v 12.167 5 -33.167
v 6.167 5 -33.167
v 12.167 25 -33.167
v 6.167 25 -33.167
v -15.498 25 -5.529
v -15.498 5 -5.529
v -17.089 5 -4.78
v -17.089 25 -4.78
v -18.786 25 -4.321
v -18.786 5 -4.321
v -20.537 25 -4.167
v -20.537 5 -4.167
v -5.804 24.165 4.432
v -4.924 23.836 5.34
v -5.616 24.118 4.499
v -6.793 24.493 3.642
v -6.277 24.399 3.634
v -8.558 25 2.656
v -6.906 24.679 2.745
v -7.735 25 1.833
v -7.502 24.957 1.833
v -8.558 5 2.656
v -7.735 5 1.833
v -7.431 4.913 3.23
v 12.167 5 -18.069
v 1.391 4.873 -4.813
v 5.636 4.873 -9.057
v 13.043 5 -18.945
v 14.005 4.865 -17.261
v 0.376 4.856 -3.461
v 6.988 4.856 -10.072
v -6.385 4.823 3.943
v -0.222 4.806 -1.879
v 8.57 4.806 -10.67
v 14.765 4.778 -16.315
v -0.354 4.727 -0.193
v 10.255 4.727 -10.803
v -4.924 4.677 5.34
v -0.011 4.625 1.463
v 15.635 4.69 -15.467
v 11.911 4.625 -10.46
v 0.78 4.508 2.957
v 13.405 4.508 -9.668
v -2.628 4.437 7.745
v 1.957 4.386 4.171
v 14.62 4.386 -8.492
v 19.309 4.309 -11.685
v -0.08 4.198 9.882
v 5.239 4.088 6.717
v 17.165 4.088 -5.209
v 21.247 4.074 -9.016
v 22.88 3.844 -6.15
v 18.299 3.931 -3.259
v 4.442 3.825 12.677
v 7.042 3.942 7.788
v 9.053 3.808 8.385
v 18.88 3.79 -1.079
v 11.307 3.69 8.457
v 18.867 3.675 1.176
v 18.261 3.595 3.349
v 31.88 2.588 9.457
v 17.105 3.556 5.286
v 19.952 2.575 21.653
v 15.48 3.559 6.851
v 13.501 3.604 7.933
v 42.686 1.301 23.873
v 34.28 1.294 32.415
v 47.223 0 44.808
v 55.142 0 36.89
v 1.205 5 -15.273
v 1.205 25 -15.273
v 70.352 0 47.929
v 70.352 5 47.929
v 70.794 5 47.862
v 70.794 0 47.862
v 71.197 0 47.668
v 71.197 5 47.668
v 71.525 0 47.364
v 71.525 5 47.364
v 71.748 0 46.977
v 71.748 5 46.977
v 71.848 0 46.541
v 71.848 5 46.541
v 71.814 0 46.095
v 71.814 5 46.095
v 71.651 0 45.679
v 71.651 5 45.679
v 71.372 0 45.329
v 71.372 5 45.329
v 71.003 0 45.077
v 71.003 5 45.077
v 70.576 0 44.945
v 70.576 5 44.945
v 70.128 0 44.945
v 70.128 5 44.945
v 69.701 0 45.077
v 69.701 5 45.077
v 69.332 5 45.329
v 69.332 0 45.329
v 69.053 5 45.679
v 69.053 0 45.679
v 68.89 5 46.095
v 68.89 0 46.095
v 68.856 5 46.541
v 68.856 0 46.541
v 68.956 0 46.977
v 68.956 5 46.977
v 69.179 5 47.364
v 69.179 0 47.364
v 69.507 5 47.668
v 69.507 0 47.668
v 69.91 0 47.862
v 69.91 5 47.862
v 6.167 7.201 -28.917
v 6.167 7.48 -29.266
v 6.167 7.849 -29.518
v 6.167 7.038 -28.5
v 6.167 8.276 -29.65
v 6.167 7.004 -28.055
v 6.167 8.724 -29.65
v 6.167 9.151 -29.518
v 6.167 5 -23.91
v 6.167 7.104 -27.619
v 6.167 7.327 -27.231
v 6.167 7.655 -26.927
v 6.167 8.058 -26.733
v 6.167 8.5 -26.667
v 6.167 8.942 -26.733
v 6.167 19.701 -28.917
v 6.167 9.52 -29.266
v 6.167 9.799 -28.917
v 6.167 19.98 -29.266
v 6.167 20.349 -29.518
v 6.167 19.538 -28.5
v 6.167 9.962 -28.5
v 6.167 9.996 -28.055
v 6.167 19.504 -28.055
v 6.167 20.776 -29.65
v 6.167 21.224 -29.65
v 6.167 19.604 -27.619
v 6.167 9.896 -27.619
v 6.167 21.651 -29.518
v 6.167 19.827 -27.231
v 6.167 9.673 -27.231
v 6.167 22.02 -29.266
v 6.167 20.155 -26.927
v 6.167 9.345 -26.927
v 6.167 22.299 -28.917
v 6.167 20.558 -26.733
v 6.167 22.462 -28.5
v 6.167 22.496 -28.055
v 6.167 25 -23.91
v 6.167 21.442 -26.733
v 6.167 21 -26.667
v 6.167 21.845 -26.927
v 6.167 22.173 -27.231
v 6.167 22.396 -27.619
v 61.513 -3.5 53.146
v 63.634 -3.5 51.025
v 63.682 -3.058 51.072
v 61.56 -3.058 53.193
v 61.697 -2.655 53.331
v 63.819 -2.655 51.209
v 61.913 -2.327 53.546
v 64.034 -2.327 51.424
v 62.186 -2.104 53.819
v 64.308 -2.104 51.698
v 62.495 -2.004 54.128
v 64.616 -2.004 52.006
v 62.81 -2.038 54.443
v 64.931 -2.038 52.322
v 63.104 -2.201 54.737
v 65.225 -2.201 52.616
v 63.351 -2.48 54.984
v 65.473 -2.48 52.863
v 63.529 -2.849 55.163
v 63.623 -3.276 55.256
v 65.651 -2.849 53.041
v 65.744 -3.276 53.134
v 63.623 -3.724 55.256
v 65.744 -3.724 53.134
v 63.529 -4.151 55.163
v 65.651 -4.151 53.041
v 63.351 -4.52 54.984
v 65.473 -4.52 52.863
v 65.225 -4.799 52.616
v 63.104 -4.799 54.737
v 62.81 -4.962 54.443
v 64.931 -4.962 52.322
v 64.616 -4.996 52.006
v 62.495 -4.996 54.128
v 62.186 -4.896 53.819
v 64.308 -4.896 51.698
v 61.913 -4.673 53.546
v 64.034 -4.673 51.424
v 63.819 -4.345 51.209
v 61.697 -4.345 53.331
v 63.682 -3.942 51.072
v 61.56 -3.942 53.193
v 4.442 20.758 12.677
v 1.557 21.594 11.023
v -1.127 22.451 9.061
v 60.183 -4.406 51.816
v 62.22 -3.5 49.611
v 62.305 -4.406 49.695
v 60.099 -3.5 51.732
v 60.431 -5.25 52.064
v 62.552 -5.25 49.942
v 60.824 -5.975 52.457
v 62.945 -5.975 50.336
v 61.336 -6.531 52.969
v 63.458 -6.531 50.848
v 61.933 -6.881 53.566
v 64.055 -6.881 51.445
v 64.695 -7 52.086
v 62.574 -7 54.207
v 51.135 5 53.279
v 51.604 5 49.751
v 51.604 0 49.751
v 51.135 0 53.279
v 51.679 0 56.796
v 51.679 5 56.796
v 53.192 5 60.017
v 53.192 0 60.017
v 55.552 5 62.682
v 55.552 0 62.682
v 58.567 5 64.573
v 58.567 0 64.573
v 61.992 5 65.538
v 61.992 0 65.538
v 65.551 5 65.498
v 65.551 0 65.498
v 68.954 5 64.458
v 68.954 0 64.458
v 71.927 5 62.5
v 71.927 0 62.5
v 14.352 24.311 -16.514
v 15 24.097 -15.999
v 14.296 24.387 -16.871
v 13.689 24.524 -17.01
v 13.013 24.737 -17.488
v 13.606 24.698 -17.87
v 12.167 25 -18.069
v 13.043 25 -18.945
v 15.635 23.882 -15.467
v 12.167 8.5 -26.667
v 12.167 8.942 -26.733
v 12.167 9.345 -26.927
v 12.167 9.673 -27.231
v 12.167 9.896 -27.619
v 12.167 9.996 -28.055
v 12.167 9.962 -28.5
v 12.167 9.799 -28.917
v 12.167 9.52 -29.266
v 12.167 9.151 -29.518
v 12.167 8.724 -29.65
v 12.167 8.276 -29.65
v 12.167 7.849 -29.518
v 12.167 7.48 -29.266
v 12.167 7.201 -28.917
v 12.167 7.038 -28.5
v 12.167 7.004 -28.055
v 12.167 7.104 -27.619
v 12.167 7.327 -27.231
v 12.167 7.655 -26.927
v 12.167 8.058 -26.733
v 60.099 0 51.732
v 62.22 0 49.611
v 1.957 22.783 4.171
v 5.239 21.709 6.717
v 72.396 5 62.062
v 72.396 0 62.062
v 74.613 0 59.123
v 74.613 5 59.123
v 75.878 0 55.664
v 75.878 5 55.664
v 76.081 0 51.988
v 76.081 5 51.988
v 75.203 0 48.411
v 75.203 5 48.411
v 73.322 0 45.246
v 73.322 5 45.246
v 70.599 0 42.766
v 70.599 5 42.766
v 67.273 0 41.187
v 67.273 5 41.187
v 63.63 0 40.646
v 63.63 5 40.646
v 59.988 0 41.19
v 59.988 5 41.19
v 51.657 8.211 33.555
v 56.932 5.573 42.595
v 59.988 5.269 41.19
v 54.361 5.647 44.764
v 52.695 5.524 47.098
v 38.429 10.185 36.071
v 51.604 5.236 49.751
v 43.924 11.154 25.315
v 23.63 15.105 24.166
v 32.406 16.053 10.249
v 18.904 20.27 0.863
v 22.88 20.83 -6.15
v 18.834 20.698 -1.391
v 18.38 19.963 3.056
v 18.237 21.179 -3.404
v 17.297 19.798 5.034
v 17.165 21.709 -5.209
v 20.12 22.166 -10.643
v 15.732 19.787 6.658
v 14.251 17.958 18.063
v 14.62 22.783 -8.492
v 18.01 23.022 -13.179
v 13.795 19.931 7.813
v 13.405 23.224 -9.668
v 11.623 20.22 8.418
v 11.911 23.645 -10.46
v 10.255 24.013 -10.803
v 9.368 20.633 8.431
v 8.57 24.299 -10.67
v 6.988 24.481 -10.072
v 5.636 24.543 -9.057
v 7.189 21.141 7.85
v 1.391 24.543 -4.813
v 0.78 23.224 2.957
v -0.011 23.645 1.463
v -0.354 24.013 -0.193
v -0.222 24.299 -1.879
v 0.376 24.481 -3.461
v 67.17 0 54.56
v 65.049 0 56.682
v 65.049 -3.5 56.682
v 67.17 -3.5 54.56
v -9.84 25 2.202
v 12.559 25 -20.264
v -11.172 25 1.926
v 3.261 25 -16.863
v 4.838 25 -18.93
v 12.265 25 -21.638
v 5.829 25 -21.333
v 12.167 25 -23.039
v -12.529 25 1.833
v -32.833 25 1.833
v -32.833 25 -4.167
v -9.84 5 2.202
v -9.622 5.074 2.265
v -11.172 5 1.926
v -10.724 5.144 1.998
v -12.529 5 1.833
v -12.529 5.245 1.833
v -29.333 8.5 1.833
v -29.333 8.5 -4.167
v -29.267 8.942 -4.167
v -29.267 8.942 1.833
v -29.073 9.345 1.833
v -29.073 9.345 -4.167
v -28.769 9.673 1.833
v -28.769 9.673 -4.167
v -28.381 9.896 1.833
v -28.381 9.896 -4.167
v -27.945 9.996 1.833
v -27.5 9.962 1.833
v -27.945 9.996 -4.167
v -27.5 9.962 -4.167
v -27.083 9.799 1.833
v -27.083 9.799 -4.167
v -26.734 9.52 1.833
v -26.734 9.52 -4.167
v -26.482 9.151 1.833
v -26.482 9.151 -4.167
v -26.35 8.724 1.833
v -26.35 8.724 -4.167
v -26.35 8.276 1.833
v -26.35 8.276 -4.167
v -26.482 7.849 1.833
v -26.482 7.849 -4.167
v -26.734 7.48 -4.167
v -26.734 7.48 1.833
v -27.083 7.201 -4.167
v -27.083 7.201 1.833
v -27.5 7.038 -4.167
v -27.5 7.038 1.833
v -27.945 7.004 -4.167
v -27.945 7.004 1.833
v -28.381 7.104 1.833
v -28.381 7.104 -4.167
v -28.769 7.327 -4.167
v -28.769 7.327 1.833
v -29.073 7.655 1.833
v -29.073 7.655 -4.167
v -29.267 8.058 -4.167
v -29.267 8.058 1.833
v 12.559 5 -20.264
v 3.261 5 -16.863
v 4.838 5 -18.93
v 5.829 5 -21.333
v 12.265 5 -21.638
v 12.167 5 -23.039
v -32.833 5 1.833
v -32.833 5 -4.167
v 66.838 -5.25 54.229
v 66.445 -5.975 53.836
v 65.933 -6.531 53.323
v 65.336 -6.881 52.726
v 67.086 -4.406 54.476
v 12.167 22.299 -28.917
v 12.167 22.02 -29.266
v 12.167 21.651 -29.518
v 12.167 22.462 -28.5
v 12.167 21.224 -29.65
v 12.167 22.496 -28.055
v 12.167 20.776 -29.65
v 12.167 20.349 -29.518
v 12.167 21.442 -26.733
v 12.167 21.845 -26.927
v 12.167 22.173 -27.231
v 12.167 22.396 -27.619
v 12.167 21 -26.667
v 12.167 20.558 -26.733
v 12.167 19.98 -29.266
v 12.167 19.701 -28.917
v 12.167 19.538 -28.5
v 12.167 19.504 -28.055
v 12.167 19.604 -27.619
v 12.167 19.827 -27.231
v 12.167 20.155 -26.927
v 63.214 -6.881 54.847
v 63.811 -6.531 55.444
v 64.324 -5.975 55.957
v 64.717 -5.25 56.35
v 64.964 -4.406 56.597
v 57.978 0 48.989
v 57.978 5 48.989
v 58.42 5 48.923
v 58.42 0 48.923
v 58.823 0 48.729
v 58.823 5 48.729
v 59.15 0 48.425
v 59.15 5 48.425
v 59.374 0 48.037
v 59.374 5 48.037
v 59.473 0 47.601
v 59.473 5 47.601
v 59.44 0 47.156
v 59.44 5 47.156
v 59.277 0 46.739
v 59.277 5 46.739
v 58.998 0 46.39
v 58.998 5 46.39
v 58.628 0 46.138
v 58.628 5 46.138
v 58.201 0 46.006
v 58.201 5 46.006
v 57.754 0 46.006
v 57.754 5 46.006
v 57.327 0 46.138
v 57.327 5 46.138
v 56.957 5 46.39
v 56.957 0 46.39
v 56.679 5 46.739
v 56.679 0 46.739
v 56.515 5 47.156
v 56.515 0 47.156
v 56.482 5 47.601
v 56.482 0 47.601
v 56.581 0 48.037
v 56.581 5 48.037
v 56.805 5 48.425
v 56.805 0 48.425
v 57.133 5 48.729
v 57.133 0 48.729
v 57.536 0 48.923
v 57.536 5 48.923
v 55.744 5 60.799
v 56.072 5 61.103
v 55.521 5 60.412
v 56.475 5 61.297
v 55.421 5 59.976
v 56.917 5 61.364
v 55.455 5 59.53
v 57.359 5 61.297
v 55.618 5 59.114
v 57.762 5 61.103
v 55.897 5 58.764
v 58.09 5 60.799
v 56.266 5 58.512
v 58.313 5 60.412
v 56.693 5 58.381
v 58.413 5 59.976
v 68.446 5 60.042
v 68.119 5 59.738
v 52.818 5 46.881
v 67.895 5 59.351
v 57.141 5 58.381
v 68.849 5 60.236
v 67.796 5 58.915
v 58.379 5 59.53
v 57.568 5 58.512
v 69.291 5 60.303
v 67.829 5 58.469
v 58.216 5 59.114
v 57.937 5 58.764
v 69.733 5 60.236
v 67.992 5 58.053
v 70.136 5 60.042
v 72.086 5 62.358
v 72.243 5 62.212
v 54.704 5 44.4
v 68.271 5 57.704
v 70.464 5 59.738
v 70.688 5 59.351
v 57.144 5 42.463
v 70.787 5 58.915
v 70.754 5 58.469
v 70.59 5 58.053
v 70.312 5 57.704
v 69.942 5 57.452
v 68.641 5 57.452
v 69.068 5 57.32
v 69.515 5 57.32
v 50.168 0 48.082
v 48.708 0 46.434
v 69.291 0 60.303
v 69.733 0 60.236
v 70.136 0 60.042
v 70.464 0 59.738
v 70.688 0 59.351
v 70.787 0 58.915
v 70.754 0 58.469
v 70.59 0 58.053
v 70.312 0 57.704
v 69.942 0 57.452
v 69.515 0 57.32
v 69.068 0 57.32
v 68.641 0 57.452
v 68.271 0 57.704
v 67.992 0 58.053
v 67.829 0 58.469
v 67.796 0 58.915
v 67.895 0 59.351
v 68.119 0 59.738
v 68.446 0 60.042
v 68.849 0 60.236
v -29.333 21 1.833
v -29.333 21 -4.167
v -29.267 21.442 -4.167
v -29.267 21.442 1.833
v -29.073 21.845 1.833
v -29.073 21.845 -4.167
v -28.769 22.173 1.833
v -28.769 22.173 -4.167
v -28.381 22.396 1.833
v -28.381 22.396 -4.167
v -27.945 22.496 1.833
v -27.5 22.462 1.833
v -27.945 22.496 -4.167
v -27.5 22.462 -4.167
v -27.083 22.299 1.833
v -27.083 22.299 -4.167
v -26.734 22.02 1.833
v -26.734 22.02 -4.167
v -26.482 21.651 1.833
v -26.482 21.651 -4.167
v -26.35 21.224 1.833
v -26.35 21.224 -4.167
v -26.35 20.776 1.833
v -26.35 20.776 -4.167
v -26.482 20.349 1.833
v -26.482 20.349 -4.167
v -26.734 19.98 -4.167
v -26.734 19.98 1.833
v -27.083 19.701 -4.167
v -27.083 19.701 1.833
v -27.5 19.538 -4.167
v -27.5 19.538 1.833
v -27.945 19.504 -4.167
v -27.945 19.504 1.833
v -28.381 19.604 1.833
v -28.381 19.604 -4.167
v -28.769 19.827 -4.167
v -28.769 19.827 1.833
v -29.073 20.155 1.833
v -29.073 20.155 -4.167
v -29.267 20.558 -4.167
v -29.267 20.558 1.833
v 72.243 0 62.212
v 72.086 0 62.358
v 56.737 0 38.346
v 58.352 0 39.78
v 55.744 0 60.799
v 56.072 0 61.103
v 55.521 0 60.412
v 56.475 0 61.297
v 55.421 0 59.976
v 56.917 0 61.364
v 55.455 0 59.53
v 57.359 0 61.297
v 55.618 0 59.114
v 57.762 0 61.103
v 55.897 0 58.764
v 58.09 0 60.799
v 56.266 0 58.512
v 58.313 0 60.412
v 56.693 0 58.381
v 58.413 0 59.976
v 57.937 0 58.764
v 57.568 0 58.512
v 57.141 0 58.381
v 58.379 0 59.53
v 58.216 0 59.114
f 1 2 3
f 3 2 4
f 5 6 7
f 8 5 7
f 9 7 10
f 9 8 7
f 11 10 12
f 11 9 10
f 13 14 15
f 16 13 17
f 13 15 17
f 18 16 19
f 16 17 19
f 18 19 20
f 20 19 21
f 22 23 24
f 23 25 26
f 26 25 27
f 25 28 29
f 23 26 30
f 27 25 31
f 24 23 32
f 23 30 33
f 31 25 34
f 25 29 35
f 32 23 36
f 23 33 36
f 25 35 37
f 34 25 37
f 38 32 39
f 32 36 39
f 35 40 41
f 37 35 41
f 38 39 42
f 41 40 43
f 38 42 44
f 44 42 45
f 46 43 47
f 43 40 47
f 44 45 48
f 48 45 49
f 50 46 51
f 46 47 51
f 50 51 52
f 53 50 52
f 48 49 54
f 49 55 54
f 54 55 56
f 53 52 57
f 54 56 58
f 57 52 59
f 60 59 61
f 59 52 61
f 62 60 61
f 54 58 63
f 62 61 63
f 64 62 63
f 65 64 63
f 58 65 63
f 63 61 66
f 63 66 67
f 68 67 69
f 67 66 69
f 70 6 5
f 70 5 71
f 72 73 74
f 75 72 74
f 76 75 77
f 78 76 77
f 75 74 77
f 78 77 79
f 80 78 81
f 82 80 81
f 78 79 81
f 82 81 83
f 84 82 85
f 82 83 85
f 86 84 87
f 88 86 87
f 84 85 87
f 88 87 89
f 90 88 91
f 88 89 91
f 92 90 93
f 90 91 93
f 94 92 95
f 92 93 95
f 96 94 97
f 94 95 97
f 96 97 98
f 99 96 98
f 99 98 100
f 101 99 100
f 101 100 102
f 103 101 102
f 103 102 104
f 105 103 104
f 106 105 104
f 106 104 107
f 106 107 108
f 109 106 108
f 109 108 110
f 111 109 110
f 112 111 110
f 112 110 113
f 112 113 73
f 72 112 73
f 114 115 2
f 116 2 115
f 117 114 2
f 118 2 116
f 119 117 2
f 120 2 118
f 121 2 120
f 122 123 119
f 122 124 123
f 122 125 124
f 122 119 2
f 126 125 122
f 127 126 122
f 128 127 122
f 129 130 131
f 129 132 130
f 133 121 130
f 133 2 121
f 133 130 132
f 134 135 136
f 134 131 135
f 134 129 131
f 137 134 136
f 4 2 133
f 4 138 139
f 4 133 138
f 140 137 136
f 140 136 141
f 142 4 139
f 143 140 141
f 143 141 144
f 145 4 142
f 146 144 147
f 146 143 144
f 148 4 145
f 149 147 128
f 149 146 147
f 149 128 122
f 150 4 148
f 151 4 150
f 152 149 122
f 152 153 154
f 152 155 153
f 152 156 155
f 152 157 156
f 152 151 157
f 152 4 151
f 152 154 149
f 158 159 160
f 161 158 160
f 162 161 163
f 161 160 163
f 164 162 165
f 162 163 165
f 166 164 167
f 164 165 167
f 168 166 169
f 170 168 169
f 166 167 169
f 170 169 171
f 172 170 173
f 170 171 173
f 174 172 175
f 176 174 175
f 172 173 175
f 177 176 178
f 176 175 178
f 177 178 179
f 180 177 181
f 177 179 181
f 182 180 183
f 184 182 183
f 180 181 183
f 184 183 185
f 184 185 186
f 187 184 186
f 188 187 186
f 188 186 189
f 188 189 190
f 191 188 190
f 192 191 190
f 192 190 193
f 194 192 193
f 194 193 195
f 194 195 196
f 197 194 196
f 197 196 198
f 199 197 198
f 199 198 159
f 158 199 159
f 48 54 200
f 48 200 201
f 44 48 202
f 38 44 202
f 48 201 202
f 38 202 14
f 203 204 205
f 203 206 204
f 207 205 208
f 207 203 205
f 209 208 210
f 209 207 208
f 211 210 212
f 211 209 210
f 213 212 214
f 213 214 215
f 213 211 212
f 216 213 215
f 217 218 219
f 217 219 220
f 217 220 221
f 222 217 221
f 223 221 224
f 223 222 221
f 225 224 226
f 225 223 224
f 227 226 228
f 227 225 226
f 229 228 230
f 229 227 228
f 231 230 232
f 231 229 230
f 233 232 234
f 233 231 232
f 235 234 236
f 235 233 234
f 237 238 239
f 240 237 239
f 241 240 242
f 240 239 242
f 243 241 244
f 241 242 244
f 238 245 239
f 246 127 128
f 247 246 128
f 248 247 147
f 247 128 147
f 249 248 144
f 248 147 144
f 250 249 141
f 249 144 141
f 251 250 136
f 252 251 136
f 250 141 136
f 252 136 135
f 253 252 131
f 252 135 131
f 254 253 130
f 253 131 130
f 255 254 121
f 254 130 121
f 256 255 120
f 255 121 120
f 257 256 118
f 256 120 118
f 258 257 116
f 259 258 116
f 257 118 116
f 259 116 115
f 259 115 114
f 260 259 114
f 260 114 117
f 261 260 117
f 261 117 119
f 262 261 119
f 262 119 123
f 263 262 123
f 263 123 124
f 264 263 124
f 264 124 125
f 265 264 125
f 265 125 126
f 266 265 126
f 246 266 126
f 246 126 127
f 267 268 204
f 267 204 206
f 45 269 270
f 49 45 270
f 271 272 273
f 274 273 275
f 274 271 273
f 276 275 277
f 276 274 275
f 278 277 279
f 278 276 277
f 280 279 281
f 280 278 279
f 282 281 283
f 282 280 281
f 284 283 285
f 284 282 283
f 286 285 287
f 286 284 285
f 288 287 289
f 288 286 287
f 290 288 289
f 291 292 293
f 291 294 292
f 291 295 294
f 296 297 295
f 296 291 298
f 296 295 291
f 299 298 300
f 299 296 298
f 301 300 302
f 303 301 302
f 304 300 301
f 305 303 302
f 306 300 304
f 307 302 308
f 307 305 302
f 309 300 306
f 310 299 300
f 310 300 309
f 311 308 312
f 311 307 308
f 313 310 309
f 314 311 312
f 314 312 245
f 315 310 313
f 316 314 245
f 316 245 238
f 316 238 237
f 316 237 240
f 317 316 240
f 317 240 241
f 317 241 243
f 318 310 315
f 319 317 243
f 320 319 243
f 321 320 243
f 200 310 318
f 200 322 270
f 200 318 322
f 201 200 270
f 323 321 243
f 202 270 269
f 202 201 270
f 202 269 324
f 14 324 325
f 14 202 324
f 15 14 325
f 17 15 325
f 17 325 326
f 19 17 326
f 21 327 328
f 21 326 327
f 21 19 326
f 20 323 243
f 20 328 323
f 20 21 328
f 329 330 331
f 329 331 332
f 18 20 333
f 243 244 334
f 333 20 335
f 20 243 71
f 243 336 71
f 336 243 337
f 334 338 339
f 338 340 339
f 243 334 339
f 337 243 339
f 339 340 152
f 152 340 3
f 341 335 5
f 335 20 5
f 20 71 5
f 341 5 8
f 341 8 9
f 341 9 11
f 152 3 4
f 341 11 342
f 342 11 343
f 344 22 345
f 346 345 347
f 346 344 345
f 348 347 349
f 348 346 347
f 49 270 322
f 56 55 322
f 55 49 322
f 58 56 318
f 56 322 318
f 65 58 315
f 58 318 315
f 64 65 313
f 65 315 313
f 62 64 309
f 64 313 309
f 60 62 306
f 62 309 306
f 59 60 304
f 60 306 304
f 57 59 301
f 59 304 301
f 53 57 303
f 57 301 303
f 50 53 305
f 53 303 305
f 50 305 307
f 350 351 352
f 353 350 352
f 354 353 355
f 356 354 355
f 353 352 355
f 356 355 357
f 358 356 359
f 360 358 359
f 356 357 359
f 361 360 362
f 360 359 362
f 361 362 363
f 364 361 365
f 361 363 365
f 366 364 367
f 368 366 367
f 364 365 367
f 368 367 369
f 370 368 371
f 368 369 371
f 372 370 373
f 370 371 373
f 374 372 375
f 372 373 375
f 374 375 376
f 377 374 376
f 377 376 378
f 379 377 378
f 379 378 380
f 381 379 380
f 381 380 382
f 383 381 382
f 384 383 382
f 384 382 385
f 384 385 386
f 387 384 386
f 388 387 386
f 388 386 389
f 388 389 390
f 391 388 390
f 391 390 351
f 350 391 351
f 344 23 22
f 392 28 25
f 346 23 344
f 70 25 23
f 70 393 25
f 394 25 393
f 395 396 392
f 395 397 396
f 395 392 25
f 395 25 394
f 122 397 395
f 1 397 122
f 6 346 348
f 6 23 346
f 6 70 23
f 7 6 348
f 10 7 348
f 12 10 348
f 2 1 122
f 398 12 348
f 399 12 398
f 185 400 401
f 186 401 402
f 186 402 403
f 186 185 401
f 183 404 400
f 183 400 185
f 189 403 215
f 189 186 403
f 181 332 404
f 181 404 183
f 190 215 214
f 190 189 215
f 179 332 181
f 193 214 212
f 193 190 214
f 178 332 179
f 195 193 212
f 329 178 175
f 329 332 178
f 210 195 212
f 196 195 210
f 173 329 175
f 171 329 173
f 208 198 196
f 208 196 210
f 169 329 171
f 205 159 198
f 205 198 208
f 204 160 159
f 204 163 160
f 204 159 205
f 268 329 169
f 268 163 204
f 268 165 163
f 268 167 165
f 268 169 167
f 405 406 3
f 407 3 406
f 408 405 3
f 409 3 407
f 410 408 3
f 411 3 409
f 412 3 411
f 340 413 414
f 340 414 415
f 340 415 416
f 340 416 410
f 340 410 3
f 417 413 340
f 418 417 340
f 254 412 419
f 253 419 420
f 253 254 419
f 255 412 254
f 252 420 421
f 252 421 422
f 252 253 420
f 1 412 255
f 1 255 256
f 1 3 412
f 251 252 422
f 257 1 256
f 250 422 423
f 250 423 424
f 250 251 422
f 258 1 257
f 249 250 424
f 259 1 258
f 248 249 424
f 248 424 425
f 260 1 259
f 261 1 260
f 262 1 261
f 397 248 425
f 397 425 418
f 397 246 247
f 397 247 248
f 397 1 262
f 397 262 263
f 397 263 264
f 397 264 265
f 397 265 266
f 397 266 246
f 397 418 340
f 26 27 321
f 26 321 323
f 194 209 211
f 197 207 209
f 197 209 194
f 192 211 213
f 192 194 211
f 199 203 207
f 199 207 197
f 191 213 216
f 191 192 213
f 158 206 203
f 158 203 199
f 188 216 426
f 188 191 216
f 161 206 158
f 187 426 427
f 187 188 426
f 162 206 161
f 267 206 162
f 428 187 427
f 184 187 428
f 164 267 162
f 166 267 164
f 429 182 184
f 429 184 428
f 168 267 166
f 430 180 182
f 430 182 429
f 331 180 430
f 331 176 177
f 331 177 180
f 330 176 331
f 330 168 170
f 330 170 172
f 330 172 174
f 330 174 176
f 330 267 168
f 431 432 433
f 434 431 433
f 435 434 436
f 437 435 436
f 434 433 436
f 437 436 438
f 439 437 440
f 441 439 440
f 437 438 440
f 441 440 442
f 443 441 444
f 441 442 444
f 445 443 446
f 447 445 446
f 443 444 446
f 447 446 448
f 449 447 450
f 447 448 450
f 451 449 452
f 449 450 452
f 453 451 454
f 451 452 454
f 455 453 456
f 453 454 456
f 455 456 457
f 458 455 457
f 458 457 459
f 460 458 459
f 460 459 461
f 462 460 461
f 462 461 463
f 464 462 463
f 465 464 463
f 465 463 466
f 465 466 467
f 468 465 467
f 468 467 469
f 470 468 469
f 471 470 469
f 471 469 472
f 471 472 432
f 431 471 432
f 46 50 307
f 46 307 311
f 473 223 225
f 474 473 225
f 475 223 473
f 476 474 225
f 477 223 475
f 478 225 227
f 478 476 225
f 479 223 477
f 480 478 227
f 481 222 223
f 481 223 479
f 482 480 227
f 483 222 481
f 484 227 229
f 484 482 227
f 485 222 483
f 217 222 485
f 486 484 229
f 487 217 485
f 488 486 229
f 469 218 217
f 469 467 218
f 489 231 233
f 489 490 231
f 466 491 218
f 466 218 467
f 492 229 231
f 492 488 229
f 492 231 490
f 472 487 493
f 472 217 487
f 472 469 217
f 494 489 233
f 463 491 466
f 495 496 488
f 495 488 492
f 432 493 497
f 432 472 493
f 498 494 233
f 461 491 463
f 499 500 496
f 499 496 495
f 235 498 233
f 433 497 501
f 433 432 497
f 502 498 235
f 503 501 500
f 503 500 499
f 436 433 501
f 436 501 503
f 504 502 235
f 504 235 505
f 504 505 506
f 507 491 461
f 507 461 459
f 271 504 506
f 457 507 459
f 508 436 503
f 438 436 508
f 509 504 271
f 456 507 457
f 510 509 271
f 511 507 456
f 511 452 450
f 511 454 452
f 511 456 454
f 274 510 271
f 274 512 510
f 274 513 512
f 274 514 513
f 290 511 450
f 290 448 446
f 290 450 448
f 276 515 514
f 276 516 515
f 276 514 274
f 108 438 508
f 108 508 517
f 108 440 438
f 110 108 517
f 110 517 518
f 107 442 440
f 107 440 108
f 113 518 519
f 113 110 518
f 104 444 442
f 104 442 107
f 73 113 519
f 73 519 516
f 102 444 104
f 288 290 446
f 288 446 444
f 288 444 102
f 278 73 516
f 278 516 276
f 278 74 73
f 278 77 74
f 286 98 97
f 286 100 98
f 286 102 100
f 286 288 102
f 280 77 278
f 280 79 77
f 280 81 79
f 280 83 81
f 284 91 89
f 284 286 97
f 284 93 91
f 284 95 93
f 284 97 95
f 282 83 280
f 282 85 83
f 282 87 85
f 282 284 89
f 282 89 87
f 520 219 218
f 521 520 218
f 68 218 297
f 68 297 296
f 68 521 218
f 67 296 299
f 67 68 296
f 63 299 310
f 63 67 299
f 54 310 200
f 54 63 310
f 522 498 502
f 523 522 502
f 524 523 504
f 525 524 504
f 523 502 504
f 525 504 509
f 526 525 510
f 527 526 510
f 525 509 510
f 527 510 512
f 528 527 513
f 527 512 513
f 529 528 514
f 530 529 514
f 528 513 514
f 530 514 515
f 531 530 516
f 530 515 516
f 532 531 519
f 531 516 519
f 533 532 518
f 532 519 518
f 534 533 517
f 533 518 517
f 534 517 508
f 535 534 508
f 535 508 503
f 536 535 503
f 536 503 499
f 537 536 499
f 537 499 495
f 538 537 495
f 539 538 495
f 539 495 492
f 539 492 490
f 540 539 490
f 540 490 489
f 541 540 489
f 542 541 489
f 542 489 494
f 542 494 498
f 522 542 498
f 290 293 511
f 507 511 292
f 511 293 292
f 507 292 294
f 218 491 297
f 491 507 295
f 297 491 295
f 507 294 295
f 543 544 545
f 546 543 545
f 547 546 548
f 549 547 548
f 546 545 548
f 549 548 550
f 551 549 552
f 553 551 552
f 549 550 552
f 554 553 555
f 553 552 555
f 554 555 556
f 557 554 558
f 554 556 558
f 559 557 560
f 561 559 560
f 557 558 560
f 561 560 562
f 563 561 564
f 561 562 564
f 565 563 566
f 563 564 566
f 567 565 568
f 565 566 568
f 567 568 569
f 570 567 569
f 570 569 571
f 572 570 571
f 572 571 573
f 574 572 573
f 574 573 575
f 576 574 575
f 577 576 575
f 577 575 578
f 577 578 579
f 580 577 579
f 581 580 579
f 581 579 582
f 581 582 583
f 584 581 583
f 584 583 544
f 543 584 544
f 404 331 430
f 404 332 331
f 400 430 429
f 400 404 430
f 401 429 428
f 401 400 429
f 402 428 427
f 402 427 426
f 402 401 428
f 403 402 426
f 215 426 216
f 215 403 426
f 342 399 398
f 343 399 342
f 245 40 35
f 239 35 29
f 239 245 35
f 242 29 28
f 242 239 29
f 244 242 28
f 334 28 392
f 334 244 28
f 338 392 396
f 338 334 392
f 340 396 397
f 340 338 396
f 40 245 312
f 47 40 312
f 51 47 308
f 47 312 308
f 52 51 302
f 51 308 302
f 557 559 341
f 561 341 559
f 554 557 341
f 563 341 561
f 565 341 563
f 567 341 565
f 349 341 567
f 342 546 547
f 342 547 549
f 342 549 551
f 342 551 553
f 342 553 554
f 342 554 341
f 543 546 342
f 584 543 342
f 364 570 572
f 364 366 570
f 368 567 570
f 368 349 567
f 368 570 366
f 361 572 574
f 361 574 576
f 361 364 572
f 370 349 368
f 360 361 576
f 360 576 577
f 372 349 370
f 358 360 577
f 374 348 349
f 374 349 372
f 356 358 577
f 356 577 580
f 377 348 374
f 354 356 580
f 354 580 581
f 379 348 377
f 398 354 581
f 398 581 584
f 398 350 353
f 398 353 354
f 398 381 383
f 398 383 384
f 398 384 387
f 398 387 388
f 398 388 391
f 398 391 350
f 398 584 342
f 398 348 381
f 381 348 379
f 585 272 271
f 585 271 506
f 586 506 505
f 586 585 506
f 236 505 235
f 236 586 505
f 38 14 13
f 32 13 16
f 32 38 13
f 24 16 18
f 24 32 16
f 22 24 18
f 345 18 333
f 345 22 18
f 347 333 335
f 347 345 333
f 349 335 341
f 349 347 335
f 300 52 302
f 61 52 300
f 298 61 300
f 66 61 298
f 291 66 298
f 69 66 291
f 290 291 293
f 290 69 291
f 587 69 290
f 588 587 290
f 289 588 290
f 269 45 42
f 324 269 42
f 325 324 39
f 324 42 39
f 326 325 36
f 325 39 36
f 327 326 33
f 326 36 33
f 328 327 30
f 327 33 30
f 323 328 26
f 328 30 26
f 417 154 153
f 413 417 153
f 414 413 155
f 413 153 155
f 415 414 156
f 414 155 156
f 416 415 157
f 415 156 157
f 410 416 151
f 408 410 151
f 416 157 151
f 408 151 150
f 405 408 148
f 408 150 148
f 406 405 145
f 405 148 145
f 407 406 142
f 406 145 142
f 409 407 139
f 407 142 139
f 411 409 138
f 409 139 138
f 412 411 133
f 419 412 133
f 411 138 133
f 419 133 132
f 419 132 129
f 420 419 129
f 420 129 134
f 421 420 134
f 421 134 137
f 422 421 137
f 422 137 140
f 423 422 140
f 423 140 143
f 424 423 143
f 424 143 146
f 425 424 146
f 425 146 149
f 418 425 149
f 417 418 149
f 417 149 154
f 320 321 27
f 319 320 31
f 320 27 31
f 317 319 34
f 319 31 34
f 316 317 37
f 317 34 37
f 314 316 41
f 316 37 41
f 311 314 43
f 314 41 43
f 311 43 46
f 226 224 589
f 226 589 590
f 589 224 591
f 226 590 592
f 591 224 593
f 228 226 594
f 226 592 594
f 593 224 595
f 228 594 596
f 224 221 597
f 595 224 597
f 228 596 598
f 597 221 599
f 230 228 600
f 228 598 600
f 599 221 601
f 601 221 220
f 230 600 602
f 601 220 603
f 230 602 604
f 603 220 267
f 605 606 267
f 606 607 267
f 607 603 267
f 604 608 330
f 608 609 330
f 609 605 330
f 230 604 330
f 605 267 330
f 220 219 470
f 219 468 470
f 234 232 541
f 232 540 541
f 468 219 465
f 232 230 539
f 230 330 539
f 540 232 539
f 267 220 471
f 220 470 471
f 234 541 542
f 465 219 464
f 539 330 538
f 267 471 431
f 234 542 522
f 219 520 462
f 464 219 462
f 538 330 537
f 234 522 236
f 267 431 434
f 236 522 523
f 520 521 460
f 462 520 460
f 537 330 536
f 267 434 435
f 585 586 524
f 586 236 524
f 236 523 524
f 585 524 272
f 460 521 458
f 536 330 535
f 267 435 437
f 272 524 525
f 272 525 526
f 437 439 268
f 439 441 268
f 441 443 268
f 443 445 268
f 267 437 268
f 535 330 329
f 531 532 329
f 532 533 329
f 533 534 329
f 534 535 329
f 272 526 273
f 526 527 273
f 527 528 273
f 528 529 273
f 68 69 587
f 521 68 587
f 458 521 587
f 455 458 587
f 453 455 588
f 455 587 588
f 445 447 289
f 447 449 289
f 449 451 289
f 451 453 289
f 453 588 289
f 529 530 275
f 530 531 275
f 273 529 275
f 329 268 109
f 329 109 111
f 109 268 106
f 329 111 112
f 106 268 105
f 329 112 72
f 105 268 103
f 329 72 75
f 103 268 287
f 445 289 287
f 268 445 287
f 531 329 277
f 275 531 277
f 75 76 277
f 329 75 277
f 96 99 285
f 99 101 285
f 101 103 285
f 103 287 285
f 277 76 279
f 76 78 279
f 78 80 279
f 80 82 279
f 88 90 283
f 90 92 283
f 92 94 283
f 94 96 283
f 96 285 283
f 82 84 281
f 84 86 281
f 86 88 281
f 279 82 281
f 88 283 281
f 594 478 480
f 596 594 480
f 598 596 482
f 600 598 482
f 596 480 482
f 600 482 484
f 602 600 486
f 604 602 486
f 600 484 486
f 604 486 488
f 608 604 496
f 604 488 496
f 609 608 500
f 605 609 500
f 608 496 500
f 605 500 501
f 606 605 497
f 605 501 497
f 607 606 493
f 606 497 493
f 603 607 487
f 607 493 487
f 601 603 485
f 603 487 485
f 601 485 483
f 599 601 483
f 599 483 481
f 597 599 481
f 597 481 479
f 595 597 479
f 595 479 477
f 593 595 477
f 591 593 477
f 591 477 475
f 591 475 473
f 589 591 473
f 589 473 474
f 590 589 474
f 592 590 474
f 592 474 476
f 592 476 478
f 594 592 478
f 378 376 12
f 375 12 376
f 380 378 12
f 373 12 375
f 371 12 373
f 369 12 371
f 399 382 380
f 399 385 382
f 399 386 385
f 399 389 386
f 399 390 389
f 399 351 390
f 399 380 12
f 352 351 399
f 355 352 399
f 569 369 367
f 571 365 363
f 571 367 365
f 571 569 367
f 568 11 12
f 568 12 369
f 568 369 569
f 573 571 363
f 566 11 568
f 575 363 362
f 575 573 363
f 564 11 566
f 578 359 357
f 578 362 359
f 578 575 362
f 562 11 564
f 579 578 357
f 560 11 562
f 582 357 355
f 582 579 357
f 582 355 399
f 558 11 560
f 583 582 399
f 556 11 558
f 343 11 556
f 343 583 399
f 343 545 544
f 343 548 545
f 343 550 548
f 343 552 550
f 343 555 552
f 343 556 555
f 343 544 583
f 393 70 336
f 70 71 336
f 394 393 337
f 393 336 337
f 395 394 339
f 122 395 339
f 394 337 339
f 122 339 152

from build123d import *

# Parameters (mm, degrees)
BOSS_EXTRUDE3_DEPTH     = 25
FILLET2_R               = 30
CUT_EXTRUDE4_DEPTH      = 25
FILLET3_R               = 6
BOSS_EXTRUDE4_DEPTH     = 25
CUT_EXTRUDE6_DEPTH      = 100
CUT_EXTRUDE6_DEPTH_BACK = 100
SKETCH10_W              = 160.183879056
SKETCH10_H              = 83.114276869
SKETCH11_R              = 12.5
BOSS_EXTRUDE5_DEPTH     = 5
CUT_EXTRUDE7_START      = 100
SKETCH12_R              = 12.5
CUT_EXTRUDE7_DEPTH      = 100
SKETCH14_R              = 1.5
CUT_EXTRUDE8_DEPTH      = 10
SKETCH15_R              = 1.5
CUT_EXTRUDE9_DEPTH      = 10
FILLET6_R               = 10
SKETCH16_R              = 1.5
CUT_EXTRUDE10_DEPTH     = 10
BOSS_EXTRUDE7_DEPTH     = 7
SKETCH19_R              = 1.5
CUT_EXTRUDE12_DEPTH     = 7
FILLET7_R               = 3.5
BOSS_EXTRUDE8_START     = 1
SKETCH20_W              = 15
SKETCH20_H              = 20
SKETCH20_R              = 1.5
BOSS_EXTRUDE8_DEPTH     = 1
BOSS_EXTRUDE9_START     = 1
SKETCH21_W              = 15
SKETCH21_H              = 20
SKETCH21_R              = 1.5
BOSS_EXTRUDE9_DEPTH     = 1
BOSS_EXTRUDE10_DEPTH    = 20
FILLET8_R               = 10


# Some blends are built 0.0001 mm under size
with BuildPart() as part:
    # Sketch1 → Boss-Extrude3 (new body)
    with BuildSketch(Plane(origin=(0, 0, 0), x_dir=(1, 0, 0), z_dir=(0, 1, 0))):
        with BuildLine():
            Line((-32.833333333, 3.166666667), (-17.833333333, 3.166666667))
            Line((-17.833333333, 3.166666667), (7.166666667, 18.166666667))
            Line((7.166666667, 18.166666667), (7.166666667, 33.166666667))
            Line((7.166666667, 33.166666667), (12.166666667, 33.166666667))
            Line((12.166666667, 33.166666667), (12.166666667, 18.166666667))
            Line((12.166666667, 18.166666667), (17.527177031, 18.166666667))
            ThreePointArc((17.527177031, 18.166666667), (37.442198793, -17.327342211), (66.165661867, -46.161270611))
            ThreePointArc((66.165661867, -46.161270611), (72.395526252, -62.062192918), (56.494603945, -55.832328533))
            ThreePointArc((56.494603945, -55.832328533), (27.660675544, -27.10886546), (-7.833333333, -7.193843698))
            Line((-7.833333333, -7.193843698), (-7.833333333, -1.833333333))
            Line((-7.833333333, -1.833333333), (-32.833333333, -1.833333333))
            Line((-32.833333333, -1.833333333), (-32.833333333, 3.166666667))
        make_face()
    extrude(amount=BOSS_EXTRUDE3_DEPTH)

    # Chamfer2
    # the kernel refuses this chamfer: 6, 5.627229018 mm, written as the material it takes off along each edge
    with BuildSketch(Plane(origin=(17.527177031, -14.820831596, -18.166666667), x_dir=(-0.9997164223008481, 0, -0.023813336221376217), z_dir=(0, 1, 0))) as chamfer2_piece_1_section:
        with BuildLine():
            Line((5.702702936, 0), (-2.525905891, 5.363294445))
            Line((-2.525905891, 5.363294445), (-2.634618021, 5.31248428))
            ThreePointArc((-2.634618021, 5.31248428), (-1.288030314, 2.670484416), (-0.110572005, -0.046624369))
            Line((-0.110572005, -0.046624369), (0.0028576, -0.119965971))
            ThreePointArc((0.0028576, -0.119965971), (2.852592138, -0.052085034), (5.705560536, -0.119965971))
            Line((5.705560536, -0.119965971), (5.702702936, 0))
        make_face()
    chamfer2_piece_1 = extrude(amount=54.641663192, mode=Mode.PRIVATE)
    chamfer2_piece_1 = split(chamfer2_piece_1, bisect_by=Plane(origin=(12.166666667, 12.5, -16.425975933), z_dir=(1, 0, 0)), keep=Keep.TOP, mode=Mode.PRIVATE)
    add(chamfer2_piece_1, mode=Mode.SUBTRACT)
    with BuildSketch(Plane(origin=(-7.833333333, -15.240510768, 7.193843698), x_dir=(-0.020819858729133396, 0, -0.999783243249505), z_dir=(0, 1, 0))) as chamfer2_piece_2_section:
        with BuildLine():
            Line((6.096204307, 0), (-2.361428154, -5.028621182))
            Line((-2.361428154, -5.028621182), (-2.470415157, -4.978403325))
            ThreePointArc((-2.470415157, -4.978403325), (-1.204815622, -2.503704319), (-0.110711113, 0.046293083))
            Line((-0.110711113, 0.046293083), (0.002498383, 0.119973989))
            ThreePointArc((0.002498383, 0.119973989), (3.049279286, 0.056526689), (6.09870269, 0.119973989))
            Line((6.09870269, 0.119973989), (6.096204307, 0))
        make_face()
    chamfer2_piece_2 = extrude(amount=55.481021536, mode=Mode.PRIVATE)
    chamfer2_piece_2 = split(chamfer2_piece_2, bisect_by=Plane(origin=(-6.193350631, 12.5, 1.833333333), z_dir=(0, 0, 1)), keep=Keep.TOP, mode=Mode.PRIVATE)
    add(chamfer2_piece_2, mode=Mode.SUBTRACT)

    # Fillet2
    # the kernel refuses this fillet: 30 mm, written as the material it takes off along each edge
    with BuildSketch(Plane(origin=(19.726764246, 45.355475944, -12.880543269), x_dir=(0.42429011681478046, 0, 0.9055263092662189), z_dir=(0, -1, 0))) as fillet2_piece_1:
        with BuildLine():
            CenterArc((8.176045785, 29.990790911), FILLET2_R, 239.5660286, 29.014271836)
            Line((-7.020306331, 4.124386399), (0, 0))
            ThreePointArc((0, 0), (3.716384448, 0.046045445), (7.432768895, 0))
        make_face()
    extrude(amount=65.710951888, mode=Mode.SUBTRACT)
    with BuildSketch(Plane(origin=(-2.883559651, 47.152983024, 9.246371963), x_dir=(0.9056360428972143, 0, 0.4240558427913414), z_dir=(0, -1, 0))) as fillet2_piece_2_section:
        with BuildLine():
            CenterArc((8.898038247, -29.989092358), FILLET2_R, 91.545096469, 31.436731661)
            Line((-7.433152225, -4.823794471), (0, 0))
            ThreePointArc((0, 0), (4.044562839, -0.05453821), (8.089125679, 0))
        make_face()
    fillet2_piece_2 = extrude(amount=69.305966049, mode=Mode.PRIVATE)
    fillet2_piece_2 = split(fillet2_piece_2, bisect_by=Plane(origin=(-2.472074329, 12.5, 1.833333333), z_dir=(0, 0, 1)), keep=Keep.TOP, mode=Mode.PRIVATE)
    add(fillet2_piece_2, mode=Mode.SUBTRACT)

    # Sketch4 → Cut-Extrude4 (cut)
    with BuildSketch(Plane(origin=(0, 25, 0), x_dir=(1, 0, 0), z_dir=(0, 1, 0))):
        with BuildLine():
            Line((17.165160832, 5.209143376), (10.448403781, 13.869842848))
            Line((10.448403781, 13.869842848), (-3.421439067, 0))
            Line((-3.421439067, 0), (5.239260404, -6.716757051))
            ThreePointArc((5.239260404, -6.716757051), (16.458811421, -6.01040764), (17.165160832, 5.209143376))
        make_face()
    extrude(amount=-CUT_EXTRUDE4_DEPTH, mode=Mode.SUBTRACT)

    # Fillet3
    fillet3_edges = [part.edges().sort_by_distance(p)[0] for p in [
        (-3.421439067, 12.5, 0),
        (10.448403781, 12.5, -13.869842848),
    ]]
    fillet(fillet3_edges, radius=FILLET3_R)

    # Sketch7 → Boss-Extrude4 (add)
    with BuildSketch(Plane(origin=(0, 25, 0), x_dir=(1, 0, 0), z_dir=(0, 1, 0))):
        Polygon((8.953526914, 27.464178608), (42.758807377, -6.341101855), (46.775588972, -2.324320261), (12.970308509, 31.480960203), align=None)
    extrude(amount=BOSS_EXTRUDE4_DEPTH)

    # Sketch10 → Cut-Extrude6 (cut, two sides: drawn at the far end of the back side and taken through both)
    with BuildSketch(Plane(origin=(22.225634356, 0, -22.225634356), x_dir=(-0.7071067811865475, 0, -0.7071067811865477), z_dir=(0.7071067811865477, 0, -0.7071067811865475)).offset(-CUT_EXTRUDE6_DEPTH_BACK)):
        with Locations((-36.711585848, 10.87638512)):
            Rectangle(SKETCH10_W, SKETCH10_H)
        Polygon((-95.075965008, 0), (-95.075965008, 5), (-72.575965008, 5), (4.173398499, 25), (18.384776311, 25), (25.455844123, 25), (25.455844123, 5), (18.384776311, 5), (4.173398499, 5), (-65.075965008, 0), align=None, mode=Mode.SUBTRACT)
    extrude(amount=CUT_EXTRUDE6_DEPTH + CUT_EXTRUDE6_DEPTH_BACK, mode=Mode.SUBTRACT)

    # Sketch11 → Boss-Extrude5 (add)
    with BuildSketch(Plane(origin=(0, 5, 0), x_dir=(1, 0, 0), z_dir=(0, 1, 0))):
        with Locations((63.634495769, -53.146232797)):
            Circle(SKETCH11_R)
    extrude(amount=-BOSS_EXTRUDE5_DEPTH)

    # Sketch12 → Cut-Extrude7 (cut)
    with BuildSketch(Plane(origin=(0, 5, 0), x_dir=(1, 0, 0), z_dir=(0, 1, 0)).offset(CUT_EXTRUDE7_START)):
        with Locations((63.634495769, -53.146232797)):
            Circle(SKETCH12_R)
    extrude(amount=-CUT_EXTRUDE7_DEPTH, mode=Mode.SUBTRACT)

    # Sketch14 → Cut-Extrude8 (cut)
    with BuildSketch(Plane.ZY.offset(-7.166666667)):
        with Locations((-28.166666667, 21)):
            Circle(SKETCH14_R)
        with Locations((-28.166666667, 8.5)):
            Circle(SKETCH14_R)
    extrude(amount=-CUT_EXTRUDE8_DEPTH, mode=Mode.SUBTRACT)

    # Sketch15 → Cut-Extrude9 (cut)
    with BuildSketch(Plane(origin=(0, 0, -3.166666667), x_dir=(-1, 0, 0), z_dir=(0, 0, -1))):
        with Locations((27.833333333, 21)):
            Circle(SKETCH15_R)
        with Locations((27.833333333, 8.5)):
            Circle(SKETCH15_R)
    extrude(amount=-CUT_EXTRUDE9_DEPTH, mode=Mode.SUBTRACT)

    # Fillet6
    # the kernel refuses this fillet: 10 mm, written as the material it adds along each edge
    with BuildSketch(Plane(origin=(-7.502347281, -7.577664342, 1.833333333), x_dir=(0.5924373658705074, 0, 0.8056165139322894), z_dir=(0, 1, 0))) as fillet6_piece_1_section:
        with BuildLine():
            CenterArc((5.078393583, -9.973648871), FILLET6_R, 94.160376696, 49.509460781)
            Line((-2.977771557, -4.049275213), (0, 0))
            ThreePointArc((0, 0), (2.176454393, -0.079053386), (4.352908785, 0))
        make_face()
    fillet6_piece_1 = extrude(amount=45.100484579, mode=Mode.PRIVATE)
    fillet6_piece_1 = split(fillet6_piece_1, bisect_by=Plane(origin=(-10.464404815, 5.138408988, 1.851355811), z_dir=(-0.05092254709852862, -0.9974035233515051, -0.05092254709852862)), keep=Keep.TOP, mode=Mode.PRIVATE)
    fillet6_piece_1 = split(fillet6_piece_1, bisect_by=Plane(origin=(-10.467928872, 5, 1.847831753), z_dir=(0, 1, 0)), keep=Keep.TOP, mode=Mode.PRIVATE)
    add(fillet6_piece_1)
    with BuildSketch(Plane(origin=(-7.502347281, -7.577664342, 1.833333333), x_dir=(0.5924373658705074, 0, 0.8056165139322894), z_dir=(0, 1, 0))) as fillet6_piece_2_section:
        with BuildLine():
            CenterArc((5.078393583, -9.973648871), FILLET6_R, 94.160376696, 49.509460781)
            Line((-2.977771557, -4.049275213), (0, 0))
            ThreePointArc((0, 0), (2.176454393, -0.079053386), (4.352908785, 0))
        make_face()
    fillet6_piece_2 = extrude(amount=45.100484579, mode=Mode.PRIVATE)
    fillet6_piece_2 = split(fillet6_piece_2, bisect_by=Plane(origin=(-6.303814001, 4.830696636, 3.717827688), z_dir=(0.05092254709852862, 0.9974035233515051, 0.05092254709852862)), keep=Keep.TOP, mode=Mode.PRIVATE)
    fillet6_piece_2 = split(fillet6_piece_2, bisect_by=Plane(origin=(-6.299503336, 5, 3.722138352), z_dir=(0, -1, 0)), keep=Keep.TOP, mode=Mode.PRIVATE)
    add(fillet6_piece_2)
    with BuildSketch(Plane(origin=(-7.502347281, -7.577664342, 1.833333333), x_dir=(0.5924373658705074, 0, 0.8056165139322894), z_dir=(0, 1, 0))) as fillet6_piece_3_section:
        with BuildLine():
            CenterArc((5.078393583, -9.973648871), FILLET6_R, 94.160376696, 49.509460781)
            Line((-2.977771557, -4.049275213), (0, 0))
            ThreePointArc((0, 0), (2.176454393, -0.079053386), (4.352908785, 0))
        make_face()
    fillet6_piece_3 = extrude(amount=45.100484579, mode=Mode.PRIVATE)
    fillet6_piece_3 = split(fillet6_piece_3, bisect_by=Plane(origin=(-8.64759618, 5.034829767, 2.063320006), z_dir=(0.05092254709852862, 0.9974035233515051, 0.05092254709852862)), keep=Keep.TOP, mode=Mode.PRIVATE)
    fillet6_piece_3 = split(fillet6_piece_3, bisect_by=Plane(origin=(-6.413698514, 24.302451402, 4.297217673), z_dir=(-0.17830914996233782, -0.9676836745958967, -0.17830914996233793)), keep=Keep.TOP, mode=Mode.PRIVATE)
    fillet6_piece_3 = split(fillet6_piece_3, bisect_by=Plane(origin=(-8.143046579, 5, 2.567869607), z_dir=(0, 1, 0)), keep=Keep.TOP, mode=Mode.PRIVATE)
    fillet6_piece_3 = split(fillet6_piece_3, bisect_by=Plane(origin=(-8.143046579, 25, 2.567869607), z_dir=(0, -1, 0)), keep=Keep.TOP, mode=Mode.PRIVATE)
    add(fillet6_piece_3)
    with BuildSketch(Plane(origin=(12.166666667, 25, -18.068743425), x_dir=(0.7999623849439977, 0, 0.6000501501330627), z_dir=(0, -1, 0))) as fillet6_piece_4_section:
        with BuildLine():
            CenterArc((5.017071581, -9.976718531), FILLET6_R, 93.910453362, 49.216057169)
            Line((-2.982552268, -3.97621703), (-3.782514653, -3.37616688))
            Line((-3.782514653, -3.37616688), (-0.799962385, 0.60005015))
            Line((-0.799962385, 0.60005015), (0.042105821, 0.999113157))
            ThreePointArc((0.042105821, 0.999113157), (1.068110264, 0.955874051), (4.266901142, 0.997671853))
            Line((4.266901142, 0.997671853), (4.335098455, 0))
        make_face()
    fillet6_piece_4 = extrude(amount=20, mode=Mode.PRIVATE)
    fillet6_piece_4 = split(fillet6_piece_4, bisect_by=Plane(origin=(12.113566037, 5.056431477, -19.120947952), z_dir=(0.05092254709852862, 0.9974035233515051, 0.05092254709852862)), keep=Keep.TOP, mode=Mode.PRIVATE)
    fillet6_piece_4 = split(fillet6_piece_4, bisect_by=Plane(origin=(14.359334309, 24.376039861, -16.875179681), z_dir=(-0.17830914996233782, -0.9676836745958967, -0.17830914996233793)), keep=Keep.TOP, mode=Mode.PRIVATE)
    add(fillet6_piece_4)
    with BuildSketch(Plane(origin=(12.166666667, 25, -18.068743425), x_dir=(0.7999623849439977, 0, 0.6000501501330627), z_dir=(0, -1, 0))) as fillet6_piece_5_section:
        with BuildLine():
            CenterArc((5.017071581, -9.976718531), FILLET6_R, 93.910453362, 49.216057169)
            Line((-2.982552268, -3.97621703), (-3.782514653, -3.37616688))
            Line((-3.782514653, -3.37616688), (-0.799962385, 0.60005015))
            Line((-0.799962385, 0.60005015), (0.042105821, 0.999113157))
            ThreePointArc((0.042105821, 0.999113157), (1.068110264, 0.955874051), (4.266901142, 0.997671853))
            Line((4.266901142, 0.997671853), (4.335098455, 0))
        make_face()
    fillet6_piece_5 = extrude(amount=20, mode=Mode.PRIVATE)
    fillet6_piece_5 = split(fillet6_piece_5, bisect_by=Plane(origin=(11.727300312, 5.177477113, -21.105564102), z_dir=(-0.05092254709852862, -0.9974035233515051, -0.05092254709852862)), keep=Keep.TOP, mode=Mode.PRIVATE)
    add(fillet6_piece_5)
    with BuildSketch(Plane(origin=(12.166666667, 25, -18.068743425), x_dir=(0.7999623849439977, 0, 0.6000501501330627), z_dir=(0, -1, 0))) as fillet6_piece_6_section:
        with BuildLine():
            CenterArc((5.017071581, -9.976718531), FILLET6_R, 93.910453362, 49.216057169)
            Line((-2.982552268, -3.97621703), (-3.782514653, -3.37616688))
            Line((-3.782514653, -3.37616688), (-0.799962385, 0.60005015))
            Line((-0.799962385, 0.60005015), (0.042105821, 0.999113157))
            ThreePointArc((0.042105821, 0.999113157), (1.068110264, 0.955874051), (4.266901142, 0.997671853))
            Line((4.266901142, 0.997671853), (4.335098455, 0))
        make_face()
    fillet6_piece_6 = extrude(amount=32.426262487, mode=Mode.PRIVATE)
    fillet6_piece_6 = split(fillet6_piece_6, bisect_by=Plane(origin=(14.095782292, 4.806456237, -16.206979714), z_dir=(0.05092254709852862, 0.9974035233515051, 0.05092254709852862)), keep=Keep.TOP, mode=Mode.PRIVATE)
    fillet6_piece_6 = split(fillet6_piece_6, bisect_by=Plane(origin=(14.100710146, 5, -16.20205186), z_dir=(0, -1, 0)), keep=Keep.TOP, mode=Mode.PRIVATE)
    add(fillet6_piece_6)

    # Sketch16 → Cut-Extrude10 (cut)
    with BuildSketch(Plane(origin=(0, 5, 0), x_dir=(1, 0, 0), z_dir=(0, 1, 0))):
        with Locations(Location((70.35201019, -46.428718376, 0), (0, 0, 270))):
            Circle(SKETCH16_R)
        with Locations(Location((57.97764152, -47.489378547, 0), (0, 0, 270))):
            Circle(SKETCH16_R)
        with Locations(Location((56.916981348, -59.863747218, 0), (0, 0, 270))):
            Circle(SKETCH16_R)
        with Locations(Location((69.291350019, -58.803087046, 0), (0, 0, 270))):
            Circle(SKETCH16_R)
    extrude(amount=-CUT_EXTRUDE10_DEPTH, mode=Mode.SUBTRACT)

    # Sketch17 → Boss-Extrude7 (add)
    with BuildSketch(Plane.XZ):
        Polygon((65.048708428, 56.68176851), (67.170027868, 54.560447263), (62.220278291, 49.610701903), (60.098958851, 51.73202315), align=None)
    extrude(amount=BOSS_EXTRUDE7_DEPTH)

    # Sketch19 → Cut-Extrude12 (cut)
    with BuildSketch(Plane(origin=(6.304761689, 0, -6.304767061), x_dir=(-0.7071070824005901, 0, -0.7071064799723766), z_dir=(0.7071064799723766, 0, -0.7071070824005901))):
        with Locations((-82.57644824, -3.5)):
            Circle(SKETCH19_R)
    extrude(amount=-CUT_EXTRUDE12_DEPTH, mode=Mode.SUBTRACT)

    # Fillet7
    fillet7_edges = [part.edges().sort_by_distance(p)[0] for p in [
        (61.159618571, -7, 50.671362527),
        (66.109368148, -7, 55.621107886),
    ]]
    fillet(fillet7_edges, radius=FILLET7_R - 0.0001)  # a hair under: the kernel refuses the full size

    # Sketch20 → Boss-Extrude8 (add)
    with BuildSketch(Plane.ZY.offset(-7.166666667).offset(BOSS_EXTRUDE8_START)):
        with Locations((-25.666666667, 15)):
            Rectangle(SKETCH20_W, SKETCH20_H)
        with Locations((-28.166666667, 21)):
            Circle(SKETCH20_R, mode=Mode.SUBTRACT)
        with Locations((-28.166666667, 8.5)):
            Circle(SKETCH20_R, mode=Mode.SUBTRACT)
    extrude(amount=-BOSS_EXTRUDE8_DEPTH)

    # Sketch21 → Boss-Extrude9 (add)
    with BuildSketch(Plane(origin=(0, 0, -3.166666667), x_dir=(-1, 0, 0), z_dir=(0, 0, -1)).offset(BOSS_EXTRUDE9_START)):
        with Locations((25.333333333, 15)):
            Rectangle(SKETCH21_W, SKETCH21_H)
        with Locations((27.833333333, 21)):
            Circle(SKETCH21_R, mode=Mode.SUBTRACT)
        with Locations((27.833333333, 8.5)):
            Circle(SKETCH21_R, mode=Mode.SUBTRACT)
    extrude(amount=-BOSS_EXTRUDE9_DEPTH)

    # Sketch22 → Boss-Extrude10 (add)
    with BuildSketch(Plane(origin=(0, 25, 0), x_dir=(1, 0, 0), z_dir=(0, 1, 0))):
        Polygon((-17.833333333, 4.166666667), (6.166666667, 18.166666667), (7.166666667, 18.166666667), (-16.710835108, 1.271788267), (-20.312073149, 2.433477958), align=None)
    extrude(amount=-BOSS_EXTRUDE10_DEPTH)

    # Fillet8
    fillet8_edges = [part.edges().sort_by_distance(p)[0] for p in [
        (6.166666667, 15, -18.166666667),
        (-17.833333333, 15, -4.166666667),
    ]]
    fillet(fillet8_edges, radius=FILLET8_R)


solid = part.part
